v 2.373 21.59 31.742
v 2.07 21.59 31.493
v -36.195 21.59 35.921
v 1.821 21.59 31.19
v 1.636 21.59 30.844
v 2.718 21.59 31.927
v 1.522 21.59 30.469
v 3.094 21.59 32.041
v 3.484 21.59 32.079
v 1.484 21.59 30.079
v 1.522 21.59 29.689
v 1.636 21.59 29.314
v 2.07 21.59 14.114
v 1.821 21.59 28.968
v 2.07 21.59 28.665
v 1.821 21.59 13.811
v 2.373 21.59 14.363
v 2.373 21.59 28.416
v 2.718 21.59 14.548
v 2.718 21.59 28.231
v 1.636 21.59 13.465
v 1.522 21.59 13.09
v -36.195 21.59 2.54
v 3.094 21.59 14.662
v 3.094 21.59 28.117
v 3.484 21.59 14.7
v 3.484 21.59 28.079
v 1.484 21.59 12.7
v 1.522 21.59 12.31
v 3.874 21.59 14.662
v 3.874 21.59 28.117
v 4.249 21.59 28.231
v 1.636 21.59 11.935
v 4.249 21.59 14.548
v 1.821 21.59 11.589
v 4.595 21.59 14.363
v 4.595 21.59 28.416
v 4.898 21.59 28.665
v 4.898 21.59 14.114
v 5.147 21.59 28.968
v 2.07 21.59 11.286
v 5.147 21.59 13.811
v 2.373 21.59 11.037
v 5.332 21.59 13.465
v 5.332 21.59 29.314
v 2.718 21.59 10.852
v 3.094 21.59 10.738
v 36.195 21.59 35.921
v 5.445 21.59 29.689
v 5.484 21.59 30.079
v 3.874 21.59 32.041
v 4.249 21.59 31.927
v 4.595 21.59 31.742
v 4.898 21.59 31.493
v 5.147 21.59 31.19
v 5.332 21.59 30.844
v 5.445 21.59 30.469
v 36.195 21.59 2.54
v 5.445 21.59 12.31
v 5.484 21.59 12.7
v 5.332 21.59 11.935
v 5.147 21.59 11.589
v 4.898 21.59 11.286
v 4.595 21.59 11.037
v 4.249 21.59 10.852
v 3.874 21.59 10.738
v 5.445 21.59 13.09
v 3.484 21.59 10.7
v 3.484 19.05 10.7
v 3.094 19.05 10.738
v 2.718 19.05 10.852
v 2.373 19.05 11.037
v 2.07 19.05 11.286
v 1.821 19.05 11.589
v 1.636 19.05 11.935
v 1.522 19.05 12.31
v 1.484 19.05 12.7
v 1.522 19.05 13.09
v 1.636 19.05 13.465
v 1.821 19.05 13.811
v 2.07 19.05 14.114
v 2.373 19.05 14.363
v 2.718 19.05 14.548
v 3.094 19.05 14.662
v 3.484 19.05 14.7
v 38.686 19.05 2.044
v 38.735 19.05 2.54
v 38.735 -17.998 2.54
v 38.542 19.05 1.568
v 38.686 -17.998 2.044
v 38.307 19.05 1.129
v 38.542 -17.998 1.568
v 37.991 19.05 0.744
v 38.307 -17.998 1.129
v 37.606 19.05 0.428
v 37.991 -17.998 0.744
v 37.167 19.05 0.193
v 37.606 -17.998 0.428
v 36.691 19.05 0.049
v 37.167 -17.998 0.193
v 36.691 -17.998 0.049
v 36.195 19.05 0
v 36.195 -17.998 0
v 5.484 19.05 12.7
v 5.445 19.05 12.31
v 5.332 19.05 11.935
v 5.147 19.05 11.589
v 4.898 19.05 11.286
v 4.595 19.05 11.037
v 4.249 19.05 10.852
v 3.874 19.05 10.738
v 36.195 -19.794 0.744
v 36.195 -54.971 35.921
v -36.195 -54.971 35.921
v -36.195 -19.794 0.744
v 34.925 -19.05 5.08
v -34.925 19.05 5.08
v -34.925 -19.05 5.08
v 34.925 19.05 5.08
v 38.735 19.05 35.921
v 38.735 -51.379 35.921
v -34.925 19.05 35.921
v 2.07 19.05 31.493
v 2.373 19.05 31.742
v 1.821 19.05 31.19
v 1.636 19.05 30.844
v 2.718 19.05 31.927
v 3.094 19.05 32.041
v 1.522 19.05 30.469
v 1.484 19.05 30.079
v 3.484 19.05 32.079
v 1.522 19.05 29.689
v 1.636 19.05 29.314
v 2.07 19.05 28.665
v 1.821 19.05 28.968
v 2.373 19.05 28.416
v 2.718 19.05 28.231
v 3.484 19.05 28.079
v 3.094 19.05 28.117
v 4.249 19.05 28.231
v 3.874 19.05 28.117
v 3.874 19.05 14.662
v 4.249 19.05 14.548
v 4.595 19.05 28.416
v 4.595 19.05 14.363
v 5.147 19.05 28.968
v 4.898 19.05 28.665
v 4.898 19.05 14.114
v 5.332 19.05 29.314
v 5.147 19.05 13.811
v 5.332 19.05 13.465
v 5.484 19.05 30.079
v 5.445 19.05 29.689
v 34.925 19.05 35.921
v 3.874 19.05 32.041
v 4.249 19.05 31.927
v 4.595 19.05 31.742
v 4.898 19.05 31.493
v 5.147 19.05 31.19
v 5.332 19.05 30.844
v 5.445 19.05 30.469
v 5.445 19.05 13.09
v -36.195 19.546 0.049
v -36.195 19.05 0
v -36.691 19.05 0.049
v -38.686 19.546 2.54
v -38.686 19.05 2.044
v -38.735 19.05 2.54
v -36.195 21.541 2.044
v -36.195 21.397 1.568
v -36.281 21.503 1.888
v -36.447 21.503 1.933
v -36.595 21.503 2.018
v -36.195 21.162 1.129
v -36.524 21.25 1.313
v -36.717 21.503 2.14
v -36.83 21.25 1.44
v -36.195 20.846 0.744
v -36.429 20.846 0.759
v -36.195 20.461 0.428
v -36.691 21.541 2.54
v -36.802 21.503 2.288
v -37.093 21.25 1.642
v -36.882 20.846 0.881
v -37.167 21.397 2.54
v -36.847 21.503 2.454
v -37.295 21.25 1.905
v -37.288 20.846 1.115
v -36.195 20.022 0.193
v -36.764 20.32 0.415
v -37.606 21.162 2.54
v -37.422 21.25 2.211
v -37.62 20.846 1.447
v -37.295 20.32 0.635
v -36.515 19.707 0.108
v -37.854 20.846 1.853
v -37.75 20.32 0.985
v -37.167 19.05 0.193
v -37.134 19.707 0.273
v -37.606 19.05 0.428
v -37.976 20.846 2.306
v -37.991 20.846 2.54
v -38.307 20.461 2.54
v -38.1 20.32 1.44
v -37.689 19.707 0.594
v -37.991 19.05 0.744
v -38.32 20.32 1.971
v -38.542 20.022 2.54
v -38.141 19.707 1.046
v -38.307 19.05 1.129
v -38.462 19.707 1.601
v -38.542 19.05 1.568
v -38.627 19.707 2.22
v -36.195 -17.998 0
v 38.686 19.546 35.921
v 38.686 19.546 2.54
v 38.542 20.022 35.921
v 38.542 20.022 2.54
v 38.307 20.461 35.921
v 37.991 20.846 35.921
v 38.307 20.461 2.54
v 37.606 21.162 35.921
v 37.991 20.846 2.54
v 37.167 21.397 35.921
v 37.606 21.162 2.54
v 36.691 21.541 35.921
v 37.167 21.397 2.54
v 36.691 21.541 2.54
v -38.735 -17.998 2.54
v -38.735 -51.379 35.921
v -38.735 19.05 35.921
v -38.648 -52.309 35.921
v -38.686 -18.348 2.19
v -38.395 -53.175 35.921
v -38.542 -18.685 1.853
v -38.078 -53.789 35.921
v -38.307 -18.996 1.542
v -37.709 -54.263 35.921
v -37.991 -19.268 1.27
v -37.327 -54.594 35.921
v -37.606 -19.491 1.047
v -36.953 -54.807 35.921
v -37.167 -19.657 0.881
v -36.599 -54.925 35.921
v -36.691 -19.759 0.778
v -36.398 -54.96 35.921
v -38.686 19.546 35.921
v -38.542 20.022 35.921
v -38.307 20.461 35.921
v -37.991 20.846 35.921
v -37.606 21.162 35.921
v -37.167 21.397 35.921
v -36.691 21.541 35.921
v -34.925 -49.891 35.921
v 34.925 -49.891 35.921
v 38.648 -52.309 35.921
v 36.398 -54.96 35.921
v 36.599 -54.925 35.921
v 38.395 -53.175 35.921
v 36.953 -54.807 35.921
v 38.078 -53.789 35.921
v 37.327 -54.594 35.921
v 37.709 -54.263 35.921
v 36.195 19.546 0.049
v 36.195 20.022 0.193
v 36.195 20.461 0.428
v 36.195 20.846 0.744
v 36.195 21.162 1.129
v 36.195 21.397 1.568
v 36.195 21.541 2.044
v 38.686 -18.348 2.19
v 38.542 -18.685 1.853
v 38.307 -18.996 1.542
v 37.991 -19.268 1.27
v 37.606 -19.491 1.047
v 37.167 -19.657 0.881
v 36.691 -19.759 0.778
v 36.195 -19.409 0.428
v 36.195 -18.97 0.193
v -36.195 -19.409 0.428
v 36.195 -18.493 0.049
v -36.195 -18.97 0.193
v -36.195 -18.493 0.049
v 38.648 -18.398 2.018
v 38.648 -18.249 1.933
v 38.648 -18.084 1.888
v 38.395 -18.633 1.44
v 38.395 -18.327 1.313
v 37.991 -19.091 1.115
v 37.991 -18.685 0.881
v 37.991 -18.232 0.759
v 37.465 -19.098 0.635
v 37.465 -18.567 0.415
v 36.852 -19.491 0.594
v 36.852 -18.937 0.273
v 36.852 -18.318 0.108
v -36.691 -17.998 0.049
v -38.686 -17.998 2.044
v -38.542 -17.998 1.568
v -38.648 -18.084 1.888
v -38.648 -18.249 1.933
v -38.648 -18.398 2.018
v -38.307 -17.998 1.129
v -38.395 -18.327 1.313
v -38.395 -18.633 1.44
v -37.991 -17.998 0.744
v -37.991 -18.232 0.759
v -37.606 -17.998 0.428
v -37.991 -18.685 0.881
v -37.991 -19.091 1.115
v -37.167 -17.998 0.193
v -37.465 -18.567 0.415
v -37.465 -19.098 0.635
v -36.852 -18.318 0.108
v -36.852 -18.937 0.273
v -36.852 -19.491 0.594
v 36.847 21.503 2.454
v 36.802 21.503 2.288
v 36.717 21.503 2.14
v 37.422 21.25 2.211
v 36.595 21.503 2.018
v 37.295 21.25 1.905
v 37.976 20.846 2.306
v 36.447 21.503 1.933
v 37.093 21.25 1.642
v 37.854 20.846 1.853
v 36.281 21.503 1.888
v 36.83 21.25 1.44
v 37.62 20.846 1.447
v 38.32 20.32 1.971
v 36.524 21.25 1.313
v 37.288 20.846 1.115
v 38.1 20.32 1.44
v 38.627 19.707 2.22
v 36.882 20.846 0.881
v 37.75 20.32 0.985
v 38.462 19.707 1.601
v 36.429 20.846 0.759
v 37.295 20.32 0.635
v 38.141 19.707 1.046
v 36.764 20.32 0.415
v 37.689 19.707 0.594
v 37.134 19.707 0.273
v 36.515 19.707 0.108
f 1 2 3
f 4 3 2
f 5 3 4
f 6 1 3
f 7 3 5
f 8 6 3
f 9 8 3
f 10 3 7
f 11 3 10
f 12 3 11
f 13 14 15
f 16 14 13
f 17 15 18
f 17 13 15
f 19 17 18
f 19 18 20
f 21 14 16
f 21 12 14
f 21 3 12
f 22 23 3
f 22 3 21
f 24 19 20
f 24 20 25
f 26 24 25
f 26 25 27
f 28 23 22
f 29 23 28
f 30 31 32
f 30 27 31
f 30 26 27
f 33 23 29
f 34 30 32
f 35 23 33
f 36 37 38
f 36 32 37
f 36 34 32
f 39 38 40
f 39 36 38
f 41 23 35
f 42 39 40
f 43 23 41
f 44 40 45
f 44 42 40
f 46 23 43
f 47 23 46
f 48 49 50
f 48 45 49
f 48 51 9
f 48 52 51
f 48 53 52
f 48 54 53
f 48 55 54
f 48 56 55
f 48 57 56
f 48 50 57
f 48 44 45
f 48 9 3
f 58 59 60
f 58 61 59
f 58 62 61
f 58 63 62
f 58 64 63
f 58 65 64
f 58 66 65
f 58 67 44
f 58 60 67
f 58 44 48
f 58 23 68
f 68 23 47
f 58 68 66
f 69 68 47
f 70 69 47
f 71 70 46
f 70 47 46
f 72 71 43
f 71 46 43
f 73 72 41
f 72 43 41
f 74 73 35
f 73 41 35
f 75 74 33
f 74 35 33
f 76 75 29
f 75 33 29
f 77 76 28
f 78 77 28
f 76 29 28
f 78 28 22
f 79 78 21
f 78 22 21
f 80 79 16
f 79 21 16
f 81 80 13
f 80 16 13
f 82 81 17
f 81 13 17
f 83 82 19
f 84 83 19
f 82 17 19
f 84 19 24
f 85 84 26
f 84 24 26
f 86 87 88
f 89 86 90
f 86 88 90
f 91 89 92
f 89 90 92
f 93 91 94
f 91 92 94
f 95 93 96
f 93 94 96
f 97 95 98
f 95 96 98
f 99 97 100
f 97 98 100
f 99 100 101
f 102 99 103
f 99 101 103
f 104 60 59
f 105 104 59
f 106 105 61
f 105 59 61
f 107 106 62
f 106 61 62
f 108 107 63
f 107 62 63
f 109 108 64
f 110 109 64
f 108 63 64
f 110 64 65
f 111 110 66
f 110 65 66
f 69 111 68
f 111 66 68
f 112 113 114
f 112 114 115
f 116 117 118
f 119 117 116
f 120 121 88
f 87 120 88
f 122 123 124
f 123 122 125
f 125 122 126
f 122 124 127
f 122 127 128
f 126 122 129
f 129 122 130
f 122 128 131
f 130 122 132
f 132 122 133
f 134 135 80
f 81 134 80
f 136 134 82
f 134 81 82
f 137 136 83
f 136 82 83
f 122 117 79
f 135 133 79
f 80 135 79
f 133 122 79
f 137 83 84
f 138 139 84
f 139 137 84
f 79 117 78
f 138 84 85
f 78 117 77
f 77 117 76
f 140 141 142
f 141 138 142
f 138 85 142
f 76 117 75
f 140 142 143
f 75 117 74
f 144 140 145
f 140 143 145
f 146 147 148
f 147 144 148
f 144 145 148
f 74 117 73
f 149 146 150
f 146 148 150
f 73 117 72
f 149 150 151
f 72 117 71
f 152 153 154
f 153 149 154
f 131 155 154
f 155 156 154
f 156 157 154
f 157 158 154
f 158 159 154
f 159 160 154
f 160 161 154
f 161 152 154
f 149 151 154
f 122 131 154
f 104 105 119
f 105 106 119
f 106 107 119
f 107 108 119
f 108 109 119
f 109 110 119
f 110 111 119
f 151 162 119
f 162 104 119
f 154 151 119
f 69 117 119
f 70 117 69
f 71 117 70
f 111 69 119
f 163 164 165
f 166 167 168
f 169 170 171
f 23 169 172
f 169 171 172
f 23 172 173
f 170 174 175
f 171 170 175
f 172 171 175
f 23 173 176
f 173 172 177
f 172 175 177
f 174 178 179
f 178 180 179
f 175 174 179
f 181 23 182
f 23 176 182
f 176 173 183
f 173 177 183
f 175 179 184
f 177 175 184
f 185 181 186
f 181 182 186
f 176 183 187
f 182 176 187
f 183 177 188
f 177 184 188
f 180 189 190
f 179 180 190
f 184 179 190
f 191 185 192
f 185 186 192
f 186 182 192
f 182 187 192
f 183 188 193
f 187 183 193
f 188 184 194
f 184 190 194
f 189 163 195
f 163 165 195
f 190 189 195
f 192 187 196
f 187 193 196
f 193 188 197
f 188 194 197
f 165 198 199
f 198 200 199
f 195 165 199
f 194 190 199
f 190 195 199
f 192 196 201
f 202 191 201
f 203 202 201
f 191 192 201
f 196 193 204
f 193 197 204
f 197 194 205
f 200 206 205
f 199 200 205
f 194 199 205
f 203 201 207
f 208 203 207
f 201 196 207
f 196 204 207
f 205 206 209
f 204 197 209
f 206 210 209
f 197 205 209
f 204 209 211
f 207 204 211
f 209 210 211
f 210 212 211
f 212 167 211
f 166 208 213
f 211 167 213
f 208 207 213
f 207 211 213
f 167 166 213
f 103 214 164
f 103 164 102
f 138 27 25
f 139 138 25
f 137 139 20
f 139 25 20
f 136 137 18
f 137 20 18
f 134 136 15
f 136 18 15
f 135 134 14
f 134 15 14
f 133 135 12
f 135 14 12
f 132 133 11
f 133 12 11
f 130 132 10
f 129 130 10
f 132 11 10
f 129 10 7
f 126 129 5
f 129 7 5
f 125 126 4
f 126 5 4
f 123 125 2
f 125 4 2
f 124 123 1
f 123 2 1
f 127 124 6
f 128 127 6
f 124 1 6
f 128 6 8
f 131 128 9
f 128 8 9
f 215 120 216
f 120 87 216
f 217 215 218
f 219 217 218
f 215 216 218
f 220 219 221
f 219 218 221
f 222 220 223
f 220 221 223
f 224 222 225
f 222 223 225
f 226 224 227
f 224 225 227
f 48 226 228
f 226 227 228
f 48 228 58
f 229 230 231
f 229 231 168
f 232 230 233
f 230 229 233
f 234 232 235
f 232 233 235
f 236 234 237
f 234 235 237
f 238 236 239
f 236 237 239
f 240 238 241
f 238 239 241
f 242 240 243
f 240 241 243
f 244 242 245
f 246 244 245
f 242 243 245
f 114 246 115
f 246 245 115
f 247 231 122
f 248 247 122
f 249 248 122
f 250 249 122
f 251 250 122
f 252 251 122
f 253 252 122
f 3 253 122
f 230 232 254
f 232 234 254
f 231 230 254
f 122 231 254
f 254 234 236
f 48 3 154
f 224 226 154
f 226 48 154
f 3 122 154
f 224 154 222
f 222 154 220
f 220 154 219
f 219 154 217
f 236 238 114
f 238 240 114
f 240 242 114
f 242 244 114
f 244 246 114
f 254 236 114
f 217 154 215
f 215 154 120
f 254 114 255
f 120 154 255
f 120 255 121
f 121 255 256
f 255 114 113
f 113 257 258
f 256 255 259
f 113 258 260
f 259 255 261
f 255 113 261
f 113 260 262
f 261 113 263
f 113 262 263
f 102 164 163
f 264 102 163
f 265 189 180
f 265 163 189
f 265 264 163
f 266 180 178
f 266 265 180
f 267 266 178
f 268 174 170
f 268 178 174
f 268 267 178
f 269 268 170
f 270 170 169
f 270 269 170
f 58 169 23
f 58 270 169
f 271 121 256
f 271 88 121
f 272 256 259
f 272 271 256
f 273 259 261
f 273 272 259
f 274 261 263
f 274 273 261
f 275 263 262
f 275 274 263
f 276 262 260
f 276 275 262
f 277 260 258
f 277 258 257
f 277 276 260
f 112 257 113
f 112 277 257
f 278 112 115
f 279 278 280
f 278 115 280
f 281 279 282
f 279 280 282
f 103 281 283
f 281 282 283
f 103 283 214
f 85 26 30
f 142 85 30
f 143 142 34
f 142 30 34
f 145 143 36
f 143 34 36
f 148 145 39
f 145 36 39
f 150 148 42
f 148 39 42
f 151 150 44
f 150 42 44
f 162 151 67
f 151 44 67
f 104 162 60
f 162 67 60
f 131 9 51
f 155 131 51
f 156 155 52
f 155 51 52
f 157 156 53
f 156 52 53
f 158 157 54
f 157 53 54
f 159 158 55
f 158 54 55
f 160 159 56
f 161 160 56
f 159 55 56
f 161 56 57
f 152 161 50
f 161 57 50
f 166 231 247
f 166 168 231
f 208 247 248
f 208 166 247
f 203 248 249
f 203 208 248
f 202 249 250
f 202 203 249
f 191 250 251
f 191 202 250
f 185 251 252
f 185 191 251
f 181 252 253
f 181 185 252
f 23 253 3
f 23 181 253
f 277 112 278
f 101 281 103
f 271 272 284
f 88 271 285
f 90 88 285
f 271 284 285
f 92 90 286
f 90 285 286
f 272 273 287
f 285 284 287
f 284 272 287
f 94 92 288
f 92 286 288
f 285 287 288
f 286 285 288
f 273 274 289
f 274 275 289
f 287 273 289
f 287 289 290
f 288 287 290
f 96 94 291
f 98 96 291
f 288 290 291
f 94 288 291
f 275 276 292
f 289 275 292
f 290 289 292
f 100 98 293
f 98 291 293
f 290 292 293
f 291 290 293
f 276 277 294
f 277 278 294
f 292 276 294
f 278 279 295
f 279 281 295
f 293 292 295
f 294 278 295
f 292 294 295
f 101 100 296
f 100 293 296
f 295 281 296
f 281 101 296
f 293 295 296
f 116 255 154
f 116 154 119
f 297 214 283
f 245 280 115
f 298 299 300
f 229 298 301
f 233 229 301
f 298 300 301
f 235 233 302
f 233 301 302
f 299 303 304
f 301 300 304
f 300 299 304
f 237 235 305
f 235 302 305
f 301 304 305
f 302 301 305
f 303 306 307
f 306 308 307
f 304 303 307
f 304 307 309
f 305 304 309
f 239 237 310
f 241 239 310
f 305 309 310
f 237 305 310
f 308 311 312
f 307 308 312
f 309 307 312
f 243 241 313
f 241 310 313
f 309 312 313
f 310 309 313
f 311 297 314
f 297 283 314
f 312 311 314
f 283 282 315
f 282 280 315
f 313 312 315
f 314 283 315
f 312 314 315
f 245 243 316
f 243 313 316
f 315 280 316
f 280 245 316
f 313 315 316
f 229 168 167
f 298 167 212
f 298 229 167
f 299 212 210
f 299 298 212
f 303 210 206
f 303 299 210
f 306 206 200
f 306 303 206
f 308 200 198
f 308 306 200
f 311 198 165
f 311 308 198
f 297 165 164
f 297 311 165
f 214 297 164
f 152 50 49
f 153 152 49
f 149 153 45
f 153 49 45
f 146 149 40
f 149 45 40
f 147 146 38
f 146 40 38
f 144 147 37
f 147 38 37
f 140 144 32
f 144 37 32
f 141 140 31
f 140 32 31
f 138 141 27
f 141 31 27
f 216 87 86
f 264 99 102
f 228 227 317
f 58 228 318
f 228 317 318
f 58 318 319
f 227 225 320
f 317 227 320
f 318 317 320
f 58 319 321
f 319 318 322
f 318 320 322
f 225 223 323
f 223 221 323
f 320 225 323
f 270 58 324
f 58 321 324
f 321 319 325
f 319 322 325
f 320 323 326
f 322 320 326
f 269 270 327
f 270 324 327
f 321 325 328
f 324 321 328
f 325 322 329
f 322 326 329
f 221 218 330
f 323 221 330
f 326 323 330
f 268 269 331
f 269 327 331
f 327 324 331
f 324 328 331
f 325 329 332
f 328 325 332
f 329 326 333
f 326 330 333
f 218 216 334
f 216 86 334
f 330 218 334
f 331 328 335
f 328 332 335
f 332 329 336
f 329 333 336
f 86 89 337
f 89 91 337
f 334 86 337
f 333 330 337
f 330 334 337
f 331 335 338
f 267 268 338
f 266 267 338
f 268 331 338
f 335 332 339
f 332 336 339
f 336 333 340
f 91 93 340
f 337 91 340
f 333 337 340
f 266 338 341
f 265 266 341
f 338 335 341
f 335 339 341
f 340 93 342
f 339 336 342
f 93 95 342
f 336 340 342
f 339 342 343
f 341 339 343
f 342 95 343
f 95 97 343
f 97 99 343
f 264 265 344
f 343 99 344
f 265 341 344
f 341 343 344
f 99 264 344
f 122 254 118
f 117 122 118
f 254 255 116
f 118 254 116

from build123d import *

# Parameters (mm, degrees)
SKETCH1_W           = 69.85
SKETCH1_H           = 38.1
BOSS_EXTRUDE1_DEPTH = 5.08
BOSS_EXTRUDE2_DEPTH = 69.85
BOSS_EXTRUDE3_DEPTH = 3.81
BOSS_EXTRUDE4_DEPTH = 3.81
SKETCH6_W           = 77.47
SKETCH6_H           = 35.921024484
BOSS_EXTRUDE5_DEPTH = 2.54
FILLET1_R           = 2.54
CUT_EXTRUDE1_DEPTH  = 2.54


with BuildPart() as part:
    # Sketch1 → Boss-Extrude1 (new body)
    with BuildSketch(Plane.XY):
        Rectangle(SKETCH1_W, SKETCH1_H)
    extrude(amount=BOSS_EXTRUDE1_DEPTH)

    # Sketch2 → Boss-Extrude2 (add)
    with BuildSketch(Plane.ZY.offset(34.925)):
        Polygon((5.08, -19.05), (20.200368371, -34.170368371), (29.556522172, -43.526522172), (35.921024484, -49.891024484), (35.921024484, -54.971024484), (0, -19.05), align=None)
    extrude(amount=-BOSS_EXTRUDE2_DEPTH)

    # Sketch3 → Boss-Extrude3 (add)
    with BuildSketch(Plane(origin=(34.925, 0, 0), x_dir=(0, 0, -1), z_dir=(1, 0, 0))):
        Polygon((-35.921024484, -54.971024484), (0, -19.05), (0, 19.05), (-35.921024484, 19.05), align=None)
    extrude(amount=BOSS_EXTRUDE3_DEPTH)

    # Sketch5 → Boss-Extrude4 (add)
    with BuildSketch(Plane.ZY.offset(34.925)):
        Polygon((5.08, 19.05), (35.921024484, 19.05), (35.921024484, -54.971024484), (0, -19.05), (0, 19.05), align=None)
    extrude(amount=BOSS_EXTRUDE4_DEPTH)

    # Sketch6 → Boss-Extrude5 (add)
    with BuildSketch(Plane(origin=(0, 19.05, 0), x_dir=(1, 0, 0), z_dir=(0, 1, 0))):
        with Locations((0, -17.960512242)):
            Rectangle(SKETCH6_W, SKETCH6_H)
    extrude(amount=BOSS_EXTRUDE5_DEPTH)

    # Fillet1
    fillet1_edges = [part.edges().sort_by_distance(p)[0] for p in [
        (38.735, -37.010512242, 17.960512242),
        (38.735, 1.27, 0),
        (-38.735, 1.27, 0),
        (-38.735, -37.010512242, 17.960512242),
        (0, -19.05, 0),
        (38.735, 21.59, 17.960512242),
        (0, 21.59, 0),
        (-38.735, 21.59, 17.960512242),
    ]]
    fillet(fillet1_edges, radius=FILLET1_R)

    # Sketch7 → Cut-Extrude1 (cut)
    with BuildSketch(Plane(origin=(0, 21.59, 0), x_dir=(1, 0, 0), z_dir=(0, 1, 0))):
        with BuildLine():
            ThreePointArc((5.483864, -12.7), (4.898077562, -11.285786438), (3.483864, -10.7))
            Line((3.483864, -10.7), (3.483864, -14.7))
            ThreePointArc((3.483864, -14.7), (4.898077562, -14.114213562), (5.483864, -12.7))
        make_face()
        with BuildLine():
            Line((3.483864, -14.7), (3.483864, -10.7))
            ThreePointArc((3.483864, -10.7), (1.483864, -12.7), (3.483864, -14.7))
        make_face()
        with BuildLine():
            ThreePointArc((5.483864, -30.079024484), (4.898077562, -28.664810922), (3.483864, -28.079024484))
            Line((3.483864, -28.079024484), (3.483864, -32.079024484))
            ThreePointArc((3.483864, -32.079024484), (4.898077562, -31.493238047), (5.483864, -30.079024484))
        make_face()
        with BuildLine():
            Line((3.483864, -32.079024484), (3.483864, -28.079024484))
            ThreePointArc((3.483864, -28.079024484), (1.483864, -30.079024484), (3.483864, -32.079024484))
        make_face()
    extrude(amount=-CUT_EXTRUDE1_DEPTH, mode=Mode.SUBTRACT)


solid = part.part
